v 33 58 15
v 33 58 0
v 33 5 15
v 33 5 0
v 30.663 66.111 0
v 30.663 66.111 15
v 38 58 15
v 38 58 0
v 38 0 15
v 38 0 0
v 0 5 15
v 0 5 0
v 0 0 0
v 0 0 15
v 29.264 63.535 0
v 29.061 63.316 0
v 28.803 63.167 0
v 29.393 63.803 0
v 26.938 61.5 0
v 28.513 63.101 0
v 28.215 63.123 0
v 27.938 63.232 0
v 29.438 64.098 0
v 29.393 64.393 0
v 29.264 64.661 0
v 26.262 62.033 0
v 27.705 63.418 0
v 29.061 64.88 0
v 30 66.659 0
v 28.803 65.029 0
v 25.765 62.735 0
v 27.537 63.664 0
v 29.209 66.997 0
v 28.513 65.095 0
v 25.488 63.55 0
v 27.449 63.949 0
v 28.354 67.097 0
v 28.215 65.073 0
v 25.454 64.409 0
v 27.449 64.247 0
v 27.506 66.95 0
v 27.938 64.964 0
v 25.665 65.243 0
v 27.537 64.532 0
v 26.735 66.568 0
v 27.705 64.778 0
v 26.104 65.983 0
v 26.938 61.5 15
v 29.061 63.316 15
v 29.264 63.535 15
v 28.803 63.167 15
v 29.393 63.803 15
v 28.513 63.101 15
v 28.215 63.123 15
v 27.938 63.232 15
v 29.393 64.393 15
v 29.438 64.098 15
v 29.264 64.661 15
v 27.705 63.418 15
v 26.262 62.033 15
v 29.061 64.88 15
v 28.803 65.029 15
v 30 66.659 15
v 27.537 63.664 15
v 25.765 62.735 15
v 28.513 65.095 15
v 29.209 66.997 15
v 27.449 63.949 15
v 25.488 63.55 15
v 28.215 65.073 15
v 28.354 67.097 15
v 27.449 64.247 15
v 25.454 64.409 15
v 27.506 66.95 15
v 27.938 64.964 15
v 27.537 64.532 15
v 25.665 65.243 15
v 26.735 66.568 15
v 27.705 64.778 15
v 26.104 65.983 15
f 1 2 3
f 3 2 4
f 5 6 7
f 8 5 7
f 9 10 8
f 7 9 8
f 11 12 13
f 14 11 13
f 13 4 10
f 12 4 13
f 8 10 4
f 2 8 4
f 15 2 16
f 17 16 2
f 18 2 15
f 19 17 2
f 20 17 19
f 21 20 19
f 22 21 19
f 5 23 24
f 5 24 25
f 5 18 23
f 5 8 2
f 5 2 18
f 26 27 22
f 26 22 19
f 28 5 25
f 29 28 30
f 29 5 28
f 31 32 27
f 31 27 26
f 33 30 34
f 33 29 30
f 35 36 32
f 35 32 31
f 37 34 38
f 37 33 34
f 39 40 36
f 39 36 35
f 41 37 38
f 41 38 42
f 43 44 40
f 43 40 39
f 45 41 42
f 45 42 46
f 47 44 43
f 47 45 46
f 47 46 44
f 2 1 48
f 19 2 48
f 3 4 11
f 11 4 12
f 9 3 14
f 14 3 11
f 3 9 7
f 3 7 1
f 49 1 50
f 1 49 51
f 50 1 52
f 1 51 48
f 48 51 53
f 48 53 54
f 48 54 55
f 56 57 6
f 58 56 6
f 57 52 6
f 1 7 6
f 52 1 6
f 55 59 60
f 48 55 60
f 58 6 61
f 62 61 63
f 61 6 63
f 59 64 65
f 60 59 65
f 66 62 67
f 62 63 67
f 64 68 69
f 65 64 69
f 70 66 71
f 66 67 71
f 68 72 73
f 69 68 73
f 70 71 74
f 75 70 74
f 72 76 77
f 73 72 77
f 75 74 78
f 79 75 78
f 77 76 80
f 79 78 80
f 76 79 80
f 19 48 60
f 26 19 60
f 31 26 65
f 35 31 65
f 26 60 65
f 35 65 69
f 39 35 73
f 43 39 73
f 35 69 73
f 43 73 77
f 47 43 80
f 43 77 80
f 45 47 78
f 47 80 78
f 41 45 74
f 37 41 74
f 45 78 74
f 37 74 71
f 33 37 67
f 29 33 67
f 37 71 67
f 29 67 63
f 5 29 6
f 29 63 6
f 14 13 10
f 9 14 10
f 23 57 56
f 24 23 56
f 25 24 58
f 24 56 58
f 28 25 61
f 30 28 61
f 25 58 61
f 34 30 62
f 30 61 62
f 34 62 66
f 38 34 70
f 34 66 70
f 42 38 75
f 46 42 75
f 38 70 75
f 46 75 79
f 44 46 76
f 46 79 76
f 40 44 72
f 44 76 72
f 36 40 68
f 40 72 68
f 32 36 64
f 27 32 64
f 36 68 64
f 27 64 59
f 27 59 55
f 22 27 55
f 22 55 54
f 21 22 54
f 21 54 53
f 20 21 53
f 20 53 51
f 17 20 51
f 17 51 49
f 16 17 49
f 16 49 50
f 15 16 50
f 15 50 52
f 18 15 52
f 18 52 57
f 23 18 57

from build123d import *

# Parameters (mm, degrees)
BOSS_EXTRUDE1_DEPTH = 15
BOSS_EXTRUDE4_DEPTH = 15
SKETCH3_R           = 1
CUT_EXTRUDE1_DEPTH  = 25


with BuildPart() as part:
    # Sketch1 → Boss-Extrude1 (new body)
    with BuildSketch(Plane.XY):
        Polygon((0, 0), (38, 0), (38, 58), (33, 58), (33, 5), (0, 5), align=None)
    extrude(amount=BOSS_EXTRUDE1_DEPTH)

    # Sketch2 → Boss-Extrude4 (add)
    with BuildSketch(Plane.XY.offset(15)):
        with BuildLine():
            Line((33, 58), (26.937822174, 61.5))
            ThreePointArc((26.937822174, 61.5), (26.104169314, 65.983298832), (30.662536905, 66.110697479))
            Line((30.662536905, 66.110697479), (38, 58))
            Line((38, 58), (33, 58))
        make_face()
    extrude(amount=-BOSS_EXTRUDE4_DEPTH)

    # Sketch3 → Cut-Extrude1 (cut)
    with BuildSketch(Plane.XY.offset(15)):
        with Locations((28.437822174, 64.098076211)):
            Circle(SKETCH3_R)
    extrude(amount=-CUT_EXTRUDE1_DEPTH, mode=Mode.SUBTRACT)


solid = part.part
